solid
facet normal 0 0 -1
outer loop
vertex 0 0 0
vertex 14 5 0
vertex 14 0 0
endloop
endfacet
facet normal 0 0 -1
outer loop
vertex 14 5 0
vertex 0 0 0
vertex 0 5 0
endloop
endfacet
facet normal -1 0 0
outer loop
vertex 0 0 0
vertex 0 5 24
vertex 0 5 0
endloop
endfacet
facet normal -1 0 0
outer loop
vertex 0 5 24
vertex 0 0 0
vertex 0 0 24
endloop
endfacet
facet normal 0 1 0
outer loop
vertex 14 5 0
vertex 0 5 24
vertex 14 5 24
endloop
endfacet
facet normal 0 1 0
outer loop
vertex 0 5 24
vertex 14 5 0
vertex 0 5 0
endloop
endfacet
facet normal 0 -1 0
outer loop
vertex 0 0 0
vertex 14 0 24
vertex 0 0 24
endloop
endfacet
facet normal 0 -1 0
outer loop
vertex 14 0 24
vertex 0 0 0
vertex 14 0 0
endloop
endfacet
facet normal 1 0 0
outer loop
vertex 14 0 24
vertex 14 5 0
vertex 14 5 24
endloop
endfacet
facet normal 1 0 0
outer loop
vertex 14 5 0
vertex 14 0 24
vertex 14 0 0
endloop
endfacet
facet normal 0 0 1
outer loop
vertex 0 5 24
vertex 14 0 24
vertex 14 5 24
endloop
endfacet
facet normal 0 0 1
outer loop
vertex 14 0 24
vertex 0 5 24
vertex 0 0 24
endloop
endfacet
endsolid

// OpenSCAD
translate([3.5, 2.5, 1.5]) color([0.6409848625624502, 0.12732081293278708, 0.2870883399952252]) cube([7, 5, 3], center=true);
translate([10.5, 2.5, 1.5]) color([0.829940686628406, 0.0555270458896614, 0.035933833430188966]) cube([7, 5, 3], center=true);
translate([3.5, 2.5, 4.5]) color([0.4178660447962945, 0.49183095909626395, 0.8633251831082008]) cube([7, 5, 3], center=true);
translate([10.5, 2.5, 4.5]) color([0.7171887463451895, 0.6735438085995347, 0.15137377239978678]) cube([7, 5, 3], center=true);
translate([3.5, 2.5, 7.5]) color([0.9867059242186832, 0.41114019628748133, 0.6117708643248599]) cube([7, 5, 3], center=true);
translate([10.5, 2.5, 7.5]) color([0.38668300553323576, 0.04703291581184044, 0.4708892090480652]) cube([7, 5, 3], center=true);
translate([3.5, 2.5, 10.5]) color([0.15136775389483625, 0.03246546237394399, 0.6174004236810055]) cube([7, 5, 3], center=true);
translate([10.5, 2.5, 10.5]) color([0.6299662912183356, 0.10529282465636491, 0.5491437662317772]) cube([7, 5, 3], center=true);
translate([3.5, 2.5, 13.5]) color([0.3466679766399683, 0.3834140731648874, 0.7764198986996783]) cube([7, 5, 3], center=true);
translate([10.5, 2.5, 13.5]) color([0.49031967752424566, 0.8812766154122413, 0.6101197429062234]) cube([7, 5, 3], center=true);
translate([3.5, 2.5, 16.5]) color([0.4671884150380703, 0.6323126400553846, 0.3378653798287524]) cube([7, 5, 3], center=true);
translate([10.5, 2.5, 16.5]) color([0.12432379252825243, 0.6825296186925238, 0.622037442746657]) cube([7, 5, 3], center=true);
translate([3.5, 2.5, 19.5]) color([0.7885664913738635, 0.1271091249471088, 0.9117833181295222]) cube([7, 5, 3], center=true);
translate([10.5, 2.5, 19.5]) color([0.799341211421814, 0.9168874080910093, 0.8725347217734669]) cube([7, 5, 3], center=true);
translate([3.5, 2.5, 22.5]) color([0.681006446357057, 0.8102508494373589, 0.5190073092314018]) cube([7, 5, 3], center=true);
translate([10.5, 2.5, 22.5]) color([0.7854891493606652, 0.18912746785718504, 0.7821141063572942]) cube([7, 5, 3], center=true);
translate([9.5, 1.0, 16.5]) color([0.44457960405634067, 0.756616221297365, 0.4554702368121878]) cube([5, 2, 3], center=true);
translate([13.0, 2.5, 16.5]) color([0.7895587282777832, 0.07533958521856021, 0.04464090542441246]) cube([2, 5, 3], center=true);
